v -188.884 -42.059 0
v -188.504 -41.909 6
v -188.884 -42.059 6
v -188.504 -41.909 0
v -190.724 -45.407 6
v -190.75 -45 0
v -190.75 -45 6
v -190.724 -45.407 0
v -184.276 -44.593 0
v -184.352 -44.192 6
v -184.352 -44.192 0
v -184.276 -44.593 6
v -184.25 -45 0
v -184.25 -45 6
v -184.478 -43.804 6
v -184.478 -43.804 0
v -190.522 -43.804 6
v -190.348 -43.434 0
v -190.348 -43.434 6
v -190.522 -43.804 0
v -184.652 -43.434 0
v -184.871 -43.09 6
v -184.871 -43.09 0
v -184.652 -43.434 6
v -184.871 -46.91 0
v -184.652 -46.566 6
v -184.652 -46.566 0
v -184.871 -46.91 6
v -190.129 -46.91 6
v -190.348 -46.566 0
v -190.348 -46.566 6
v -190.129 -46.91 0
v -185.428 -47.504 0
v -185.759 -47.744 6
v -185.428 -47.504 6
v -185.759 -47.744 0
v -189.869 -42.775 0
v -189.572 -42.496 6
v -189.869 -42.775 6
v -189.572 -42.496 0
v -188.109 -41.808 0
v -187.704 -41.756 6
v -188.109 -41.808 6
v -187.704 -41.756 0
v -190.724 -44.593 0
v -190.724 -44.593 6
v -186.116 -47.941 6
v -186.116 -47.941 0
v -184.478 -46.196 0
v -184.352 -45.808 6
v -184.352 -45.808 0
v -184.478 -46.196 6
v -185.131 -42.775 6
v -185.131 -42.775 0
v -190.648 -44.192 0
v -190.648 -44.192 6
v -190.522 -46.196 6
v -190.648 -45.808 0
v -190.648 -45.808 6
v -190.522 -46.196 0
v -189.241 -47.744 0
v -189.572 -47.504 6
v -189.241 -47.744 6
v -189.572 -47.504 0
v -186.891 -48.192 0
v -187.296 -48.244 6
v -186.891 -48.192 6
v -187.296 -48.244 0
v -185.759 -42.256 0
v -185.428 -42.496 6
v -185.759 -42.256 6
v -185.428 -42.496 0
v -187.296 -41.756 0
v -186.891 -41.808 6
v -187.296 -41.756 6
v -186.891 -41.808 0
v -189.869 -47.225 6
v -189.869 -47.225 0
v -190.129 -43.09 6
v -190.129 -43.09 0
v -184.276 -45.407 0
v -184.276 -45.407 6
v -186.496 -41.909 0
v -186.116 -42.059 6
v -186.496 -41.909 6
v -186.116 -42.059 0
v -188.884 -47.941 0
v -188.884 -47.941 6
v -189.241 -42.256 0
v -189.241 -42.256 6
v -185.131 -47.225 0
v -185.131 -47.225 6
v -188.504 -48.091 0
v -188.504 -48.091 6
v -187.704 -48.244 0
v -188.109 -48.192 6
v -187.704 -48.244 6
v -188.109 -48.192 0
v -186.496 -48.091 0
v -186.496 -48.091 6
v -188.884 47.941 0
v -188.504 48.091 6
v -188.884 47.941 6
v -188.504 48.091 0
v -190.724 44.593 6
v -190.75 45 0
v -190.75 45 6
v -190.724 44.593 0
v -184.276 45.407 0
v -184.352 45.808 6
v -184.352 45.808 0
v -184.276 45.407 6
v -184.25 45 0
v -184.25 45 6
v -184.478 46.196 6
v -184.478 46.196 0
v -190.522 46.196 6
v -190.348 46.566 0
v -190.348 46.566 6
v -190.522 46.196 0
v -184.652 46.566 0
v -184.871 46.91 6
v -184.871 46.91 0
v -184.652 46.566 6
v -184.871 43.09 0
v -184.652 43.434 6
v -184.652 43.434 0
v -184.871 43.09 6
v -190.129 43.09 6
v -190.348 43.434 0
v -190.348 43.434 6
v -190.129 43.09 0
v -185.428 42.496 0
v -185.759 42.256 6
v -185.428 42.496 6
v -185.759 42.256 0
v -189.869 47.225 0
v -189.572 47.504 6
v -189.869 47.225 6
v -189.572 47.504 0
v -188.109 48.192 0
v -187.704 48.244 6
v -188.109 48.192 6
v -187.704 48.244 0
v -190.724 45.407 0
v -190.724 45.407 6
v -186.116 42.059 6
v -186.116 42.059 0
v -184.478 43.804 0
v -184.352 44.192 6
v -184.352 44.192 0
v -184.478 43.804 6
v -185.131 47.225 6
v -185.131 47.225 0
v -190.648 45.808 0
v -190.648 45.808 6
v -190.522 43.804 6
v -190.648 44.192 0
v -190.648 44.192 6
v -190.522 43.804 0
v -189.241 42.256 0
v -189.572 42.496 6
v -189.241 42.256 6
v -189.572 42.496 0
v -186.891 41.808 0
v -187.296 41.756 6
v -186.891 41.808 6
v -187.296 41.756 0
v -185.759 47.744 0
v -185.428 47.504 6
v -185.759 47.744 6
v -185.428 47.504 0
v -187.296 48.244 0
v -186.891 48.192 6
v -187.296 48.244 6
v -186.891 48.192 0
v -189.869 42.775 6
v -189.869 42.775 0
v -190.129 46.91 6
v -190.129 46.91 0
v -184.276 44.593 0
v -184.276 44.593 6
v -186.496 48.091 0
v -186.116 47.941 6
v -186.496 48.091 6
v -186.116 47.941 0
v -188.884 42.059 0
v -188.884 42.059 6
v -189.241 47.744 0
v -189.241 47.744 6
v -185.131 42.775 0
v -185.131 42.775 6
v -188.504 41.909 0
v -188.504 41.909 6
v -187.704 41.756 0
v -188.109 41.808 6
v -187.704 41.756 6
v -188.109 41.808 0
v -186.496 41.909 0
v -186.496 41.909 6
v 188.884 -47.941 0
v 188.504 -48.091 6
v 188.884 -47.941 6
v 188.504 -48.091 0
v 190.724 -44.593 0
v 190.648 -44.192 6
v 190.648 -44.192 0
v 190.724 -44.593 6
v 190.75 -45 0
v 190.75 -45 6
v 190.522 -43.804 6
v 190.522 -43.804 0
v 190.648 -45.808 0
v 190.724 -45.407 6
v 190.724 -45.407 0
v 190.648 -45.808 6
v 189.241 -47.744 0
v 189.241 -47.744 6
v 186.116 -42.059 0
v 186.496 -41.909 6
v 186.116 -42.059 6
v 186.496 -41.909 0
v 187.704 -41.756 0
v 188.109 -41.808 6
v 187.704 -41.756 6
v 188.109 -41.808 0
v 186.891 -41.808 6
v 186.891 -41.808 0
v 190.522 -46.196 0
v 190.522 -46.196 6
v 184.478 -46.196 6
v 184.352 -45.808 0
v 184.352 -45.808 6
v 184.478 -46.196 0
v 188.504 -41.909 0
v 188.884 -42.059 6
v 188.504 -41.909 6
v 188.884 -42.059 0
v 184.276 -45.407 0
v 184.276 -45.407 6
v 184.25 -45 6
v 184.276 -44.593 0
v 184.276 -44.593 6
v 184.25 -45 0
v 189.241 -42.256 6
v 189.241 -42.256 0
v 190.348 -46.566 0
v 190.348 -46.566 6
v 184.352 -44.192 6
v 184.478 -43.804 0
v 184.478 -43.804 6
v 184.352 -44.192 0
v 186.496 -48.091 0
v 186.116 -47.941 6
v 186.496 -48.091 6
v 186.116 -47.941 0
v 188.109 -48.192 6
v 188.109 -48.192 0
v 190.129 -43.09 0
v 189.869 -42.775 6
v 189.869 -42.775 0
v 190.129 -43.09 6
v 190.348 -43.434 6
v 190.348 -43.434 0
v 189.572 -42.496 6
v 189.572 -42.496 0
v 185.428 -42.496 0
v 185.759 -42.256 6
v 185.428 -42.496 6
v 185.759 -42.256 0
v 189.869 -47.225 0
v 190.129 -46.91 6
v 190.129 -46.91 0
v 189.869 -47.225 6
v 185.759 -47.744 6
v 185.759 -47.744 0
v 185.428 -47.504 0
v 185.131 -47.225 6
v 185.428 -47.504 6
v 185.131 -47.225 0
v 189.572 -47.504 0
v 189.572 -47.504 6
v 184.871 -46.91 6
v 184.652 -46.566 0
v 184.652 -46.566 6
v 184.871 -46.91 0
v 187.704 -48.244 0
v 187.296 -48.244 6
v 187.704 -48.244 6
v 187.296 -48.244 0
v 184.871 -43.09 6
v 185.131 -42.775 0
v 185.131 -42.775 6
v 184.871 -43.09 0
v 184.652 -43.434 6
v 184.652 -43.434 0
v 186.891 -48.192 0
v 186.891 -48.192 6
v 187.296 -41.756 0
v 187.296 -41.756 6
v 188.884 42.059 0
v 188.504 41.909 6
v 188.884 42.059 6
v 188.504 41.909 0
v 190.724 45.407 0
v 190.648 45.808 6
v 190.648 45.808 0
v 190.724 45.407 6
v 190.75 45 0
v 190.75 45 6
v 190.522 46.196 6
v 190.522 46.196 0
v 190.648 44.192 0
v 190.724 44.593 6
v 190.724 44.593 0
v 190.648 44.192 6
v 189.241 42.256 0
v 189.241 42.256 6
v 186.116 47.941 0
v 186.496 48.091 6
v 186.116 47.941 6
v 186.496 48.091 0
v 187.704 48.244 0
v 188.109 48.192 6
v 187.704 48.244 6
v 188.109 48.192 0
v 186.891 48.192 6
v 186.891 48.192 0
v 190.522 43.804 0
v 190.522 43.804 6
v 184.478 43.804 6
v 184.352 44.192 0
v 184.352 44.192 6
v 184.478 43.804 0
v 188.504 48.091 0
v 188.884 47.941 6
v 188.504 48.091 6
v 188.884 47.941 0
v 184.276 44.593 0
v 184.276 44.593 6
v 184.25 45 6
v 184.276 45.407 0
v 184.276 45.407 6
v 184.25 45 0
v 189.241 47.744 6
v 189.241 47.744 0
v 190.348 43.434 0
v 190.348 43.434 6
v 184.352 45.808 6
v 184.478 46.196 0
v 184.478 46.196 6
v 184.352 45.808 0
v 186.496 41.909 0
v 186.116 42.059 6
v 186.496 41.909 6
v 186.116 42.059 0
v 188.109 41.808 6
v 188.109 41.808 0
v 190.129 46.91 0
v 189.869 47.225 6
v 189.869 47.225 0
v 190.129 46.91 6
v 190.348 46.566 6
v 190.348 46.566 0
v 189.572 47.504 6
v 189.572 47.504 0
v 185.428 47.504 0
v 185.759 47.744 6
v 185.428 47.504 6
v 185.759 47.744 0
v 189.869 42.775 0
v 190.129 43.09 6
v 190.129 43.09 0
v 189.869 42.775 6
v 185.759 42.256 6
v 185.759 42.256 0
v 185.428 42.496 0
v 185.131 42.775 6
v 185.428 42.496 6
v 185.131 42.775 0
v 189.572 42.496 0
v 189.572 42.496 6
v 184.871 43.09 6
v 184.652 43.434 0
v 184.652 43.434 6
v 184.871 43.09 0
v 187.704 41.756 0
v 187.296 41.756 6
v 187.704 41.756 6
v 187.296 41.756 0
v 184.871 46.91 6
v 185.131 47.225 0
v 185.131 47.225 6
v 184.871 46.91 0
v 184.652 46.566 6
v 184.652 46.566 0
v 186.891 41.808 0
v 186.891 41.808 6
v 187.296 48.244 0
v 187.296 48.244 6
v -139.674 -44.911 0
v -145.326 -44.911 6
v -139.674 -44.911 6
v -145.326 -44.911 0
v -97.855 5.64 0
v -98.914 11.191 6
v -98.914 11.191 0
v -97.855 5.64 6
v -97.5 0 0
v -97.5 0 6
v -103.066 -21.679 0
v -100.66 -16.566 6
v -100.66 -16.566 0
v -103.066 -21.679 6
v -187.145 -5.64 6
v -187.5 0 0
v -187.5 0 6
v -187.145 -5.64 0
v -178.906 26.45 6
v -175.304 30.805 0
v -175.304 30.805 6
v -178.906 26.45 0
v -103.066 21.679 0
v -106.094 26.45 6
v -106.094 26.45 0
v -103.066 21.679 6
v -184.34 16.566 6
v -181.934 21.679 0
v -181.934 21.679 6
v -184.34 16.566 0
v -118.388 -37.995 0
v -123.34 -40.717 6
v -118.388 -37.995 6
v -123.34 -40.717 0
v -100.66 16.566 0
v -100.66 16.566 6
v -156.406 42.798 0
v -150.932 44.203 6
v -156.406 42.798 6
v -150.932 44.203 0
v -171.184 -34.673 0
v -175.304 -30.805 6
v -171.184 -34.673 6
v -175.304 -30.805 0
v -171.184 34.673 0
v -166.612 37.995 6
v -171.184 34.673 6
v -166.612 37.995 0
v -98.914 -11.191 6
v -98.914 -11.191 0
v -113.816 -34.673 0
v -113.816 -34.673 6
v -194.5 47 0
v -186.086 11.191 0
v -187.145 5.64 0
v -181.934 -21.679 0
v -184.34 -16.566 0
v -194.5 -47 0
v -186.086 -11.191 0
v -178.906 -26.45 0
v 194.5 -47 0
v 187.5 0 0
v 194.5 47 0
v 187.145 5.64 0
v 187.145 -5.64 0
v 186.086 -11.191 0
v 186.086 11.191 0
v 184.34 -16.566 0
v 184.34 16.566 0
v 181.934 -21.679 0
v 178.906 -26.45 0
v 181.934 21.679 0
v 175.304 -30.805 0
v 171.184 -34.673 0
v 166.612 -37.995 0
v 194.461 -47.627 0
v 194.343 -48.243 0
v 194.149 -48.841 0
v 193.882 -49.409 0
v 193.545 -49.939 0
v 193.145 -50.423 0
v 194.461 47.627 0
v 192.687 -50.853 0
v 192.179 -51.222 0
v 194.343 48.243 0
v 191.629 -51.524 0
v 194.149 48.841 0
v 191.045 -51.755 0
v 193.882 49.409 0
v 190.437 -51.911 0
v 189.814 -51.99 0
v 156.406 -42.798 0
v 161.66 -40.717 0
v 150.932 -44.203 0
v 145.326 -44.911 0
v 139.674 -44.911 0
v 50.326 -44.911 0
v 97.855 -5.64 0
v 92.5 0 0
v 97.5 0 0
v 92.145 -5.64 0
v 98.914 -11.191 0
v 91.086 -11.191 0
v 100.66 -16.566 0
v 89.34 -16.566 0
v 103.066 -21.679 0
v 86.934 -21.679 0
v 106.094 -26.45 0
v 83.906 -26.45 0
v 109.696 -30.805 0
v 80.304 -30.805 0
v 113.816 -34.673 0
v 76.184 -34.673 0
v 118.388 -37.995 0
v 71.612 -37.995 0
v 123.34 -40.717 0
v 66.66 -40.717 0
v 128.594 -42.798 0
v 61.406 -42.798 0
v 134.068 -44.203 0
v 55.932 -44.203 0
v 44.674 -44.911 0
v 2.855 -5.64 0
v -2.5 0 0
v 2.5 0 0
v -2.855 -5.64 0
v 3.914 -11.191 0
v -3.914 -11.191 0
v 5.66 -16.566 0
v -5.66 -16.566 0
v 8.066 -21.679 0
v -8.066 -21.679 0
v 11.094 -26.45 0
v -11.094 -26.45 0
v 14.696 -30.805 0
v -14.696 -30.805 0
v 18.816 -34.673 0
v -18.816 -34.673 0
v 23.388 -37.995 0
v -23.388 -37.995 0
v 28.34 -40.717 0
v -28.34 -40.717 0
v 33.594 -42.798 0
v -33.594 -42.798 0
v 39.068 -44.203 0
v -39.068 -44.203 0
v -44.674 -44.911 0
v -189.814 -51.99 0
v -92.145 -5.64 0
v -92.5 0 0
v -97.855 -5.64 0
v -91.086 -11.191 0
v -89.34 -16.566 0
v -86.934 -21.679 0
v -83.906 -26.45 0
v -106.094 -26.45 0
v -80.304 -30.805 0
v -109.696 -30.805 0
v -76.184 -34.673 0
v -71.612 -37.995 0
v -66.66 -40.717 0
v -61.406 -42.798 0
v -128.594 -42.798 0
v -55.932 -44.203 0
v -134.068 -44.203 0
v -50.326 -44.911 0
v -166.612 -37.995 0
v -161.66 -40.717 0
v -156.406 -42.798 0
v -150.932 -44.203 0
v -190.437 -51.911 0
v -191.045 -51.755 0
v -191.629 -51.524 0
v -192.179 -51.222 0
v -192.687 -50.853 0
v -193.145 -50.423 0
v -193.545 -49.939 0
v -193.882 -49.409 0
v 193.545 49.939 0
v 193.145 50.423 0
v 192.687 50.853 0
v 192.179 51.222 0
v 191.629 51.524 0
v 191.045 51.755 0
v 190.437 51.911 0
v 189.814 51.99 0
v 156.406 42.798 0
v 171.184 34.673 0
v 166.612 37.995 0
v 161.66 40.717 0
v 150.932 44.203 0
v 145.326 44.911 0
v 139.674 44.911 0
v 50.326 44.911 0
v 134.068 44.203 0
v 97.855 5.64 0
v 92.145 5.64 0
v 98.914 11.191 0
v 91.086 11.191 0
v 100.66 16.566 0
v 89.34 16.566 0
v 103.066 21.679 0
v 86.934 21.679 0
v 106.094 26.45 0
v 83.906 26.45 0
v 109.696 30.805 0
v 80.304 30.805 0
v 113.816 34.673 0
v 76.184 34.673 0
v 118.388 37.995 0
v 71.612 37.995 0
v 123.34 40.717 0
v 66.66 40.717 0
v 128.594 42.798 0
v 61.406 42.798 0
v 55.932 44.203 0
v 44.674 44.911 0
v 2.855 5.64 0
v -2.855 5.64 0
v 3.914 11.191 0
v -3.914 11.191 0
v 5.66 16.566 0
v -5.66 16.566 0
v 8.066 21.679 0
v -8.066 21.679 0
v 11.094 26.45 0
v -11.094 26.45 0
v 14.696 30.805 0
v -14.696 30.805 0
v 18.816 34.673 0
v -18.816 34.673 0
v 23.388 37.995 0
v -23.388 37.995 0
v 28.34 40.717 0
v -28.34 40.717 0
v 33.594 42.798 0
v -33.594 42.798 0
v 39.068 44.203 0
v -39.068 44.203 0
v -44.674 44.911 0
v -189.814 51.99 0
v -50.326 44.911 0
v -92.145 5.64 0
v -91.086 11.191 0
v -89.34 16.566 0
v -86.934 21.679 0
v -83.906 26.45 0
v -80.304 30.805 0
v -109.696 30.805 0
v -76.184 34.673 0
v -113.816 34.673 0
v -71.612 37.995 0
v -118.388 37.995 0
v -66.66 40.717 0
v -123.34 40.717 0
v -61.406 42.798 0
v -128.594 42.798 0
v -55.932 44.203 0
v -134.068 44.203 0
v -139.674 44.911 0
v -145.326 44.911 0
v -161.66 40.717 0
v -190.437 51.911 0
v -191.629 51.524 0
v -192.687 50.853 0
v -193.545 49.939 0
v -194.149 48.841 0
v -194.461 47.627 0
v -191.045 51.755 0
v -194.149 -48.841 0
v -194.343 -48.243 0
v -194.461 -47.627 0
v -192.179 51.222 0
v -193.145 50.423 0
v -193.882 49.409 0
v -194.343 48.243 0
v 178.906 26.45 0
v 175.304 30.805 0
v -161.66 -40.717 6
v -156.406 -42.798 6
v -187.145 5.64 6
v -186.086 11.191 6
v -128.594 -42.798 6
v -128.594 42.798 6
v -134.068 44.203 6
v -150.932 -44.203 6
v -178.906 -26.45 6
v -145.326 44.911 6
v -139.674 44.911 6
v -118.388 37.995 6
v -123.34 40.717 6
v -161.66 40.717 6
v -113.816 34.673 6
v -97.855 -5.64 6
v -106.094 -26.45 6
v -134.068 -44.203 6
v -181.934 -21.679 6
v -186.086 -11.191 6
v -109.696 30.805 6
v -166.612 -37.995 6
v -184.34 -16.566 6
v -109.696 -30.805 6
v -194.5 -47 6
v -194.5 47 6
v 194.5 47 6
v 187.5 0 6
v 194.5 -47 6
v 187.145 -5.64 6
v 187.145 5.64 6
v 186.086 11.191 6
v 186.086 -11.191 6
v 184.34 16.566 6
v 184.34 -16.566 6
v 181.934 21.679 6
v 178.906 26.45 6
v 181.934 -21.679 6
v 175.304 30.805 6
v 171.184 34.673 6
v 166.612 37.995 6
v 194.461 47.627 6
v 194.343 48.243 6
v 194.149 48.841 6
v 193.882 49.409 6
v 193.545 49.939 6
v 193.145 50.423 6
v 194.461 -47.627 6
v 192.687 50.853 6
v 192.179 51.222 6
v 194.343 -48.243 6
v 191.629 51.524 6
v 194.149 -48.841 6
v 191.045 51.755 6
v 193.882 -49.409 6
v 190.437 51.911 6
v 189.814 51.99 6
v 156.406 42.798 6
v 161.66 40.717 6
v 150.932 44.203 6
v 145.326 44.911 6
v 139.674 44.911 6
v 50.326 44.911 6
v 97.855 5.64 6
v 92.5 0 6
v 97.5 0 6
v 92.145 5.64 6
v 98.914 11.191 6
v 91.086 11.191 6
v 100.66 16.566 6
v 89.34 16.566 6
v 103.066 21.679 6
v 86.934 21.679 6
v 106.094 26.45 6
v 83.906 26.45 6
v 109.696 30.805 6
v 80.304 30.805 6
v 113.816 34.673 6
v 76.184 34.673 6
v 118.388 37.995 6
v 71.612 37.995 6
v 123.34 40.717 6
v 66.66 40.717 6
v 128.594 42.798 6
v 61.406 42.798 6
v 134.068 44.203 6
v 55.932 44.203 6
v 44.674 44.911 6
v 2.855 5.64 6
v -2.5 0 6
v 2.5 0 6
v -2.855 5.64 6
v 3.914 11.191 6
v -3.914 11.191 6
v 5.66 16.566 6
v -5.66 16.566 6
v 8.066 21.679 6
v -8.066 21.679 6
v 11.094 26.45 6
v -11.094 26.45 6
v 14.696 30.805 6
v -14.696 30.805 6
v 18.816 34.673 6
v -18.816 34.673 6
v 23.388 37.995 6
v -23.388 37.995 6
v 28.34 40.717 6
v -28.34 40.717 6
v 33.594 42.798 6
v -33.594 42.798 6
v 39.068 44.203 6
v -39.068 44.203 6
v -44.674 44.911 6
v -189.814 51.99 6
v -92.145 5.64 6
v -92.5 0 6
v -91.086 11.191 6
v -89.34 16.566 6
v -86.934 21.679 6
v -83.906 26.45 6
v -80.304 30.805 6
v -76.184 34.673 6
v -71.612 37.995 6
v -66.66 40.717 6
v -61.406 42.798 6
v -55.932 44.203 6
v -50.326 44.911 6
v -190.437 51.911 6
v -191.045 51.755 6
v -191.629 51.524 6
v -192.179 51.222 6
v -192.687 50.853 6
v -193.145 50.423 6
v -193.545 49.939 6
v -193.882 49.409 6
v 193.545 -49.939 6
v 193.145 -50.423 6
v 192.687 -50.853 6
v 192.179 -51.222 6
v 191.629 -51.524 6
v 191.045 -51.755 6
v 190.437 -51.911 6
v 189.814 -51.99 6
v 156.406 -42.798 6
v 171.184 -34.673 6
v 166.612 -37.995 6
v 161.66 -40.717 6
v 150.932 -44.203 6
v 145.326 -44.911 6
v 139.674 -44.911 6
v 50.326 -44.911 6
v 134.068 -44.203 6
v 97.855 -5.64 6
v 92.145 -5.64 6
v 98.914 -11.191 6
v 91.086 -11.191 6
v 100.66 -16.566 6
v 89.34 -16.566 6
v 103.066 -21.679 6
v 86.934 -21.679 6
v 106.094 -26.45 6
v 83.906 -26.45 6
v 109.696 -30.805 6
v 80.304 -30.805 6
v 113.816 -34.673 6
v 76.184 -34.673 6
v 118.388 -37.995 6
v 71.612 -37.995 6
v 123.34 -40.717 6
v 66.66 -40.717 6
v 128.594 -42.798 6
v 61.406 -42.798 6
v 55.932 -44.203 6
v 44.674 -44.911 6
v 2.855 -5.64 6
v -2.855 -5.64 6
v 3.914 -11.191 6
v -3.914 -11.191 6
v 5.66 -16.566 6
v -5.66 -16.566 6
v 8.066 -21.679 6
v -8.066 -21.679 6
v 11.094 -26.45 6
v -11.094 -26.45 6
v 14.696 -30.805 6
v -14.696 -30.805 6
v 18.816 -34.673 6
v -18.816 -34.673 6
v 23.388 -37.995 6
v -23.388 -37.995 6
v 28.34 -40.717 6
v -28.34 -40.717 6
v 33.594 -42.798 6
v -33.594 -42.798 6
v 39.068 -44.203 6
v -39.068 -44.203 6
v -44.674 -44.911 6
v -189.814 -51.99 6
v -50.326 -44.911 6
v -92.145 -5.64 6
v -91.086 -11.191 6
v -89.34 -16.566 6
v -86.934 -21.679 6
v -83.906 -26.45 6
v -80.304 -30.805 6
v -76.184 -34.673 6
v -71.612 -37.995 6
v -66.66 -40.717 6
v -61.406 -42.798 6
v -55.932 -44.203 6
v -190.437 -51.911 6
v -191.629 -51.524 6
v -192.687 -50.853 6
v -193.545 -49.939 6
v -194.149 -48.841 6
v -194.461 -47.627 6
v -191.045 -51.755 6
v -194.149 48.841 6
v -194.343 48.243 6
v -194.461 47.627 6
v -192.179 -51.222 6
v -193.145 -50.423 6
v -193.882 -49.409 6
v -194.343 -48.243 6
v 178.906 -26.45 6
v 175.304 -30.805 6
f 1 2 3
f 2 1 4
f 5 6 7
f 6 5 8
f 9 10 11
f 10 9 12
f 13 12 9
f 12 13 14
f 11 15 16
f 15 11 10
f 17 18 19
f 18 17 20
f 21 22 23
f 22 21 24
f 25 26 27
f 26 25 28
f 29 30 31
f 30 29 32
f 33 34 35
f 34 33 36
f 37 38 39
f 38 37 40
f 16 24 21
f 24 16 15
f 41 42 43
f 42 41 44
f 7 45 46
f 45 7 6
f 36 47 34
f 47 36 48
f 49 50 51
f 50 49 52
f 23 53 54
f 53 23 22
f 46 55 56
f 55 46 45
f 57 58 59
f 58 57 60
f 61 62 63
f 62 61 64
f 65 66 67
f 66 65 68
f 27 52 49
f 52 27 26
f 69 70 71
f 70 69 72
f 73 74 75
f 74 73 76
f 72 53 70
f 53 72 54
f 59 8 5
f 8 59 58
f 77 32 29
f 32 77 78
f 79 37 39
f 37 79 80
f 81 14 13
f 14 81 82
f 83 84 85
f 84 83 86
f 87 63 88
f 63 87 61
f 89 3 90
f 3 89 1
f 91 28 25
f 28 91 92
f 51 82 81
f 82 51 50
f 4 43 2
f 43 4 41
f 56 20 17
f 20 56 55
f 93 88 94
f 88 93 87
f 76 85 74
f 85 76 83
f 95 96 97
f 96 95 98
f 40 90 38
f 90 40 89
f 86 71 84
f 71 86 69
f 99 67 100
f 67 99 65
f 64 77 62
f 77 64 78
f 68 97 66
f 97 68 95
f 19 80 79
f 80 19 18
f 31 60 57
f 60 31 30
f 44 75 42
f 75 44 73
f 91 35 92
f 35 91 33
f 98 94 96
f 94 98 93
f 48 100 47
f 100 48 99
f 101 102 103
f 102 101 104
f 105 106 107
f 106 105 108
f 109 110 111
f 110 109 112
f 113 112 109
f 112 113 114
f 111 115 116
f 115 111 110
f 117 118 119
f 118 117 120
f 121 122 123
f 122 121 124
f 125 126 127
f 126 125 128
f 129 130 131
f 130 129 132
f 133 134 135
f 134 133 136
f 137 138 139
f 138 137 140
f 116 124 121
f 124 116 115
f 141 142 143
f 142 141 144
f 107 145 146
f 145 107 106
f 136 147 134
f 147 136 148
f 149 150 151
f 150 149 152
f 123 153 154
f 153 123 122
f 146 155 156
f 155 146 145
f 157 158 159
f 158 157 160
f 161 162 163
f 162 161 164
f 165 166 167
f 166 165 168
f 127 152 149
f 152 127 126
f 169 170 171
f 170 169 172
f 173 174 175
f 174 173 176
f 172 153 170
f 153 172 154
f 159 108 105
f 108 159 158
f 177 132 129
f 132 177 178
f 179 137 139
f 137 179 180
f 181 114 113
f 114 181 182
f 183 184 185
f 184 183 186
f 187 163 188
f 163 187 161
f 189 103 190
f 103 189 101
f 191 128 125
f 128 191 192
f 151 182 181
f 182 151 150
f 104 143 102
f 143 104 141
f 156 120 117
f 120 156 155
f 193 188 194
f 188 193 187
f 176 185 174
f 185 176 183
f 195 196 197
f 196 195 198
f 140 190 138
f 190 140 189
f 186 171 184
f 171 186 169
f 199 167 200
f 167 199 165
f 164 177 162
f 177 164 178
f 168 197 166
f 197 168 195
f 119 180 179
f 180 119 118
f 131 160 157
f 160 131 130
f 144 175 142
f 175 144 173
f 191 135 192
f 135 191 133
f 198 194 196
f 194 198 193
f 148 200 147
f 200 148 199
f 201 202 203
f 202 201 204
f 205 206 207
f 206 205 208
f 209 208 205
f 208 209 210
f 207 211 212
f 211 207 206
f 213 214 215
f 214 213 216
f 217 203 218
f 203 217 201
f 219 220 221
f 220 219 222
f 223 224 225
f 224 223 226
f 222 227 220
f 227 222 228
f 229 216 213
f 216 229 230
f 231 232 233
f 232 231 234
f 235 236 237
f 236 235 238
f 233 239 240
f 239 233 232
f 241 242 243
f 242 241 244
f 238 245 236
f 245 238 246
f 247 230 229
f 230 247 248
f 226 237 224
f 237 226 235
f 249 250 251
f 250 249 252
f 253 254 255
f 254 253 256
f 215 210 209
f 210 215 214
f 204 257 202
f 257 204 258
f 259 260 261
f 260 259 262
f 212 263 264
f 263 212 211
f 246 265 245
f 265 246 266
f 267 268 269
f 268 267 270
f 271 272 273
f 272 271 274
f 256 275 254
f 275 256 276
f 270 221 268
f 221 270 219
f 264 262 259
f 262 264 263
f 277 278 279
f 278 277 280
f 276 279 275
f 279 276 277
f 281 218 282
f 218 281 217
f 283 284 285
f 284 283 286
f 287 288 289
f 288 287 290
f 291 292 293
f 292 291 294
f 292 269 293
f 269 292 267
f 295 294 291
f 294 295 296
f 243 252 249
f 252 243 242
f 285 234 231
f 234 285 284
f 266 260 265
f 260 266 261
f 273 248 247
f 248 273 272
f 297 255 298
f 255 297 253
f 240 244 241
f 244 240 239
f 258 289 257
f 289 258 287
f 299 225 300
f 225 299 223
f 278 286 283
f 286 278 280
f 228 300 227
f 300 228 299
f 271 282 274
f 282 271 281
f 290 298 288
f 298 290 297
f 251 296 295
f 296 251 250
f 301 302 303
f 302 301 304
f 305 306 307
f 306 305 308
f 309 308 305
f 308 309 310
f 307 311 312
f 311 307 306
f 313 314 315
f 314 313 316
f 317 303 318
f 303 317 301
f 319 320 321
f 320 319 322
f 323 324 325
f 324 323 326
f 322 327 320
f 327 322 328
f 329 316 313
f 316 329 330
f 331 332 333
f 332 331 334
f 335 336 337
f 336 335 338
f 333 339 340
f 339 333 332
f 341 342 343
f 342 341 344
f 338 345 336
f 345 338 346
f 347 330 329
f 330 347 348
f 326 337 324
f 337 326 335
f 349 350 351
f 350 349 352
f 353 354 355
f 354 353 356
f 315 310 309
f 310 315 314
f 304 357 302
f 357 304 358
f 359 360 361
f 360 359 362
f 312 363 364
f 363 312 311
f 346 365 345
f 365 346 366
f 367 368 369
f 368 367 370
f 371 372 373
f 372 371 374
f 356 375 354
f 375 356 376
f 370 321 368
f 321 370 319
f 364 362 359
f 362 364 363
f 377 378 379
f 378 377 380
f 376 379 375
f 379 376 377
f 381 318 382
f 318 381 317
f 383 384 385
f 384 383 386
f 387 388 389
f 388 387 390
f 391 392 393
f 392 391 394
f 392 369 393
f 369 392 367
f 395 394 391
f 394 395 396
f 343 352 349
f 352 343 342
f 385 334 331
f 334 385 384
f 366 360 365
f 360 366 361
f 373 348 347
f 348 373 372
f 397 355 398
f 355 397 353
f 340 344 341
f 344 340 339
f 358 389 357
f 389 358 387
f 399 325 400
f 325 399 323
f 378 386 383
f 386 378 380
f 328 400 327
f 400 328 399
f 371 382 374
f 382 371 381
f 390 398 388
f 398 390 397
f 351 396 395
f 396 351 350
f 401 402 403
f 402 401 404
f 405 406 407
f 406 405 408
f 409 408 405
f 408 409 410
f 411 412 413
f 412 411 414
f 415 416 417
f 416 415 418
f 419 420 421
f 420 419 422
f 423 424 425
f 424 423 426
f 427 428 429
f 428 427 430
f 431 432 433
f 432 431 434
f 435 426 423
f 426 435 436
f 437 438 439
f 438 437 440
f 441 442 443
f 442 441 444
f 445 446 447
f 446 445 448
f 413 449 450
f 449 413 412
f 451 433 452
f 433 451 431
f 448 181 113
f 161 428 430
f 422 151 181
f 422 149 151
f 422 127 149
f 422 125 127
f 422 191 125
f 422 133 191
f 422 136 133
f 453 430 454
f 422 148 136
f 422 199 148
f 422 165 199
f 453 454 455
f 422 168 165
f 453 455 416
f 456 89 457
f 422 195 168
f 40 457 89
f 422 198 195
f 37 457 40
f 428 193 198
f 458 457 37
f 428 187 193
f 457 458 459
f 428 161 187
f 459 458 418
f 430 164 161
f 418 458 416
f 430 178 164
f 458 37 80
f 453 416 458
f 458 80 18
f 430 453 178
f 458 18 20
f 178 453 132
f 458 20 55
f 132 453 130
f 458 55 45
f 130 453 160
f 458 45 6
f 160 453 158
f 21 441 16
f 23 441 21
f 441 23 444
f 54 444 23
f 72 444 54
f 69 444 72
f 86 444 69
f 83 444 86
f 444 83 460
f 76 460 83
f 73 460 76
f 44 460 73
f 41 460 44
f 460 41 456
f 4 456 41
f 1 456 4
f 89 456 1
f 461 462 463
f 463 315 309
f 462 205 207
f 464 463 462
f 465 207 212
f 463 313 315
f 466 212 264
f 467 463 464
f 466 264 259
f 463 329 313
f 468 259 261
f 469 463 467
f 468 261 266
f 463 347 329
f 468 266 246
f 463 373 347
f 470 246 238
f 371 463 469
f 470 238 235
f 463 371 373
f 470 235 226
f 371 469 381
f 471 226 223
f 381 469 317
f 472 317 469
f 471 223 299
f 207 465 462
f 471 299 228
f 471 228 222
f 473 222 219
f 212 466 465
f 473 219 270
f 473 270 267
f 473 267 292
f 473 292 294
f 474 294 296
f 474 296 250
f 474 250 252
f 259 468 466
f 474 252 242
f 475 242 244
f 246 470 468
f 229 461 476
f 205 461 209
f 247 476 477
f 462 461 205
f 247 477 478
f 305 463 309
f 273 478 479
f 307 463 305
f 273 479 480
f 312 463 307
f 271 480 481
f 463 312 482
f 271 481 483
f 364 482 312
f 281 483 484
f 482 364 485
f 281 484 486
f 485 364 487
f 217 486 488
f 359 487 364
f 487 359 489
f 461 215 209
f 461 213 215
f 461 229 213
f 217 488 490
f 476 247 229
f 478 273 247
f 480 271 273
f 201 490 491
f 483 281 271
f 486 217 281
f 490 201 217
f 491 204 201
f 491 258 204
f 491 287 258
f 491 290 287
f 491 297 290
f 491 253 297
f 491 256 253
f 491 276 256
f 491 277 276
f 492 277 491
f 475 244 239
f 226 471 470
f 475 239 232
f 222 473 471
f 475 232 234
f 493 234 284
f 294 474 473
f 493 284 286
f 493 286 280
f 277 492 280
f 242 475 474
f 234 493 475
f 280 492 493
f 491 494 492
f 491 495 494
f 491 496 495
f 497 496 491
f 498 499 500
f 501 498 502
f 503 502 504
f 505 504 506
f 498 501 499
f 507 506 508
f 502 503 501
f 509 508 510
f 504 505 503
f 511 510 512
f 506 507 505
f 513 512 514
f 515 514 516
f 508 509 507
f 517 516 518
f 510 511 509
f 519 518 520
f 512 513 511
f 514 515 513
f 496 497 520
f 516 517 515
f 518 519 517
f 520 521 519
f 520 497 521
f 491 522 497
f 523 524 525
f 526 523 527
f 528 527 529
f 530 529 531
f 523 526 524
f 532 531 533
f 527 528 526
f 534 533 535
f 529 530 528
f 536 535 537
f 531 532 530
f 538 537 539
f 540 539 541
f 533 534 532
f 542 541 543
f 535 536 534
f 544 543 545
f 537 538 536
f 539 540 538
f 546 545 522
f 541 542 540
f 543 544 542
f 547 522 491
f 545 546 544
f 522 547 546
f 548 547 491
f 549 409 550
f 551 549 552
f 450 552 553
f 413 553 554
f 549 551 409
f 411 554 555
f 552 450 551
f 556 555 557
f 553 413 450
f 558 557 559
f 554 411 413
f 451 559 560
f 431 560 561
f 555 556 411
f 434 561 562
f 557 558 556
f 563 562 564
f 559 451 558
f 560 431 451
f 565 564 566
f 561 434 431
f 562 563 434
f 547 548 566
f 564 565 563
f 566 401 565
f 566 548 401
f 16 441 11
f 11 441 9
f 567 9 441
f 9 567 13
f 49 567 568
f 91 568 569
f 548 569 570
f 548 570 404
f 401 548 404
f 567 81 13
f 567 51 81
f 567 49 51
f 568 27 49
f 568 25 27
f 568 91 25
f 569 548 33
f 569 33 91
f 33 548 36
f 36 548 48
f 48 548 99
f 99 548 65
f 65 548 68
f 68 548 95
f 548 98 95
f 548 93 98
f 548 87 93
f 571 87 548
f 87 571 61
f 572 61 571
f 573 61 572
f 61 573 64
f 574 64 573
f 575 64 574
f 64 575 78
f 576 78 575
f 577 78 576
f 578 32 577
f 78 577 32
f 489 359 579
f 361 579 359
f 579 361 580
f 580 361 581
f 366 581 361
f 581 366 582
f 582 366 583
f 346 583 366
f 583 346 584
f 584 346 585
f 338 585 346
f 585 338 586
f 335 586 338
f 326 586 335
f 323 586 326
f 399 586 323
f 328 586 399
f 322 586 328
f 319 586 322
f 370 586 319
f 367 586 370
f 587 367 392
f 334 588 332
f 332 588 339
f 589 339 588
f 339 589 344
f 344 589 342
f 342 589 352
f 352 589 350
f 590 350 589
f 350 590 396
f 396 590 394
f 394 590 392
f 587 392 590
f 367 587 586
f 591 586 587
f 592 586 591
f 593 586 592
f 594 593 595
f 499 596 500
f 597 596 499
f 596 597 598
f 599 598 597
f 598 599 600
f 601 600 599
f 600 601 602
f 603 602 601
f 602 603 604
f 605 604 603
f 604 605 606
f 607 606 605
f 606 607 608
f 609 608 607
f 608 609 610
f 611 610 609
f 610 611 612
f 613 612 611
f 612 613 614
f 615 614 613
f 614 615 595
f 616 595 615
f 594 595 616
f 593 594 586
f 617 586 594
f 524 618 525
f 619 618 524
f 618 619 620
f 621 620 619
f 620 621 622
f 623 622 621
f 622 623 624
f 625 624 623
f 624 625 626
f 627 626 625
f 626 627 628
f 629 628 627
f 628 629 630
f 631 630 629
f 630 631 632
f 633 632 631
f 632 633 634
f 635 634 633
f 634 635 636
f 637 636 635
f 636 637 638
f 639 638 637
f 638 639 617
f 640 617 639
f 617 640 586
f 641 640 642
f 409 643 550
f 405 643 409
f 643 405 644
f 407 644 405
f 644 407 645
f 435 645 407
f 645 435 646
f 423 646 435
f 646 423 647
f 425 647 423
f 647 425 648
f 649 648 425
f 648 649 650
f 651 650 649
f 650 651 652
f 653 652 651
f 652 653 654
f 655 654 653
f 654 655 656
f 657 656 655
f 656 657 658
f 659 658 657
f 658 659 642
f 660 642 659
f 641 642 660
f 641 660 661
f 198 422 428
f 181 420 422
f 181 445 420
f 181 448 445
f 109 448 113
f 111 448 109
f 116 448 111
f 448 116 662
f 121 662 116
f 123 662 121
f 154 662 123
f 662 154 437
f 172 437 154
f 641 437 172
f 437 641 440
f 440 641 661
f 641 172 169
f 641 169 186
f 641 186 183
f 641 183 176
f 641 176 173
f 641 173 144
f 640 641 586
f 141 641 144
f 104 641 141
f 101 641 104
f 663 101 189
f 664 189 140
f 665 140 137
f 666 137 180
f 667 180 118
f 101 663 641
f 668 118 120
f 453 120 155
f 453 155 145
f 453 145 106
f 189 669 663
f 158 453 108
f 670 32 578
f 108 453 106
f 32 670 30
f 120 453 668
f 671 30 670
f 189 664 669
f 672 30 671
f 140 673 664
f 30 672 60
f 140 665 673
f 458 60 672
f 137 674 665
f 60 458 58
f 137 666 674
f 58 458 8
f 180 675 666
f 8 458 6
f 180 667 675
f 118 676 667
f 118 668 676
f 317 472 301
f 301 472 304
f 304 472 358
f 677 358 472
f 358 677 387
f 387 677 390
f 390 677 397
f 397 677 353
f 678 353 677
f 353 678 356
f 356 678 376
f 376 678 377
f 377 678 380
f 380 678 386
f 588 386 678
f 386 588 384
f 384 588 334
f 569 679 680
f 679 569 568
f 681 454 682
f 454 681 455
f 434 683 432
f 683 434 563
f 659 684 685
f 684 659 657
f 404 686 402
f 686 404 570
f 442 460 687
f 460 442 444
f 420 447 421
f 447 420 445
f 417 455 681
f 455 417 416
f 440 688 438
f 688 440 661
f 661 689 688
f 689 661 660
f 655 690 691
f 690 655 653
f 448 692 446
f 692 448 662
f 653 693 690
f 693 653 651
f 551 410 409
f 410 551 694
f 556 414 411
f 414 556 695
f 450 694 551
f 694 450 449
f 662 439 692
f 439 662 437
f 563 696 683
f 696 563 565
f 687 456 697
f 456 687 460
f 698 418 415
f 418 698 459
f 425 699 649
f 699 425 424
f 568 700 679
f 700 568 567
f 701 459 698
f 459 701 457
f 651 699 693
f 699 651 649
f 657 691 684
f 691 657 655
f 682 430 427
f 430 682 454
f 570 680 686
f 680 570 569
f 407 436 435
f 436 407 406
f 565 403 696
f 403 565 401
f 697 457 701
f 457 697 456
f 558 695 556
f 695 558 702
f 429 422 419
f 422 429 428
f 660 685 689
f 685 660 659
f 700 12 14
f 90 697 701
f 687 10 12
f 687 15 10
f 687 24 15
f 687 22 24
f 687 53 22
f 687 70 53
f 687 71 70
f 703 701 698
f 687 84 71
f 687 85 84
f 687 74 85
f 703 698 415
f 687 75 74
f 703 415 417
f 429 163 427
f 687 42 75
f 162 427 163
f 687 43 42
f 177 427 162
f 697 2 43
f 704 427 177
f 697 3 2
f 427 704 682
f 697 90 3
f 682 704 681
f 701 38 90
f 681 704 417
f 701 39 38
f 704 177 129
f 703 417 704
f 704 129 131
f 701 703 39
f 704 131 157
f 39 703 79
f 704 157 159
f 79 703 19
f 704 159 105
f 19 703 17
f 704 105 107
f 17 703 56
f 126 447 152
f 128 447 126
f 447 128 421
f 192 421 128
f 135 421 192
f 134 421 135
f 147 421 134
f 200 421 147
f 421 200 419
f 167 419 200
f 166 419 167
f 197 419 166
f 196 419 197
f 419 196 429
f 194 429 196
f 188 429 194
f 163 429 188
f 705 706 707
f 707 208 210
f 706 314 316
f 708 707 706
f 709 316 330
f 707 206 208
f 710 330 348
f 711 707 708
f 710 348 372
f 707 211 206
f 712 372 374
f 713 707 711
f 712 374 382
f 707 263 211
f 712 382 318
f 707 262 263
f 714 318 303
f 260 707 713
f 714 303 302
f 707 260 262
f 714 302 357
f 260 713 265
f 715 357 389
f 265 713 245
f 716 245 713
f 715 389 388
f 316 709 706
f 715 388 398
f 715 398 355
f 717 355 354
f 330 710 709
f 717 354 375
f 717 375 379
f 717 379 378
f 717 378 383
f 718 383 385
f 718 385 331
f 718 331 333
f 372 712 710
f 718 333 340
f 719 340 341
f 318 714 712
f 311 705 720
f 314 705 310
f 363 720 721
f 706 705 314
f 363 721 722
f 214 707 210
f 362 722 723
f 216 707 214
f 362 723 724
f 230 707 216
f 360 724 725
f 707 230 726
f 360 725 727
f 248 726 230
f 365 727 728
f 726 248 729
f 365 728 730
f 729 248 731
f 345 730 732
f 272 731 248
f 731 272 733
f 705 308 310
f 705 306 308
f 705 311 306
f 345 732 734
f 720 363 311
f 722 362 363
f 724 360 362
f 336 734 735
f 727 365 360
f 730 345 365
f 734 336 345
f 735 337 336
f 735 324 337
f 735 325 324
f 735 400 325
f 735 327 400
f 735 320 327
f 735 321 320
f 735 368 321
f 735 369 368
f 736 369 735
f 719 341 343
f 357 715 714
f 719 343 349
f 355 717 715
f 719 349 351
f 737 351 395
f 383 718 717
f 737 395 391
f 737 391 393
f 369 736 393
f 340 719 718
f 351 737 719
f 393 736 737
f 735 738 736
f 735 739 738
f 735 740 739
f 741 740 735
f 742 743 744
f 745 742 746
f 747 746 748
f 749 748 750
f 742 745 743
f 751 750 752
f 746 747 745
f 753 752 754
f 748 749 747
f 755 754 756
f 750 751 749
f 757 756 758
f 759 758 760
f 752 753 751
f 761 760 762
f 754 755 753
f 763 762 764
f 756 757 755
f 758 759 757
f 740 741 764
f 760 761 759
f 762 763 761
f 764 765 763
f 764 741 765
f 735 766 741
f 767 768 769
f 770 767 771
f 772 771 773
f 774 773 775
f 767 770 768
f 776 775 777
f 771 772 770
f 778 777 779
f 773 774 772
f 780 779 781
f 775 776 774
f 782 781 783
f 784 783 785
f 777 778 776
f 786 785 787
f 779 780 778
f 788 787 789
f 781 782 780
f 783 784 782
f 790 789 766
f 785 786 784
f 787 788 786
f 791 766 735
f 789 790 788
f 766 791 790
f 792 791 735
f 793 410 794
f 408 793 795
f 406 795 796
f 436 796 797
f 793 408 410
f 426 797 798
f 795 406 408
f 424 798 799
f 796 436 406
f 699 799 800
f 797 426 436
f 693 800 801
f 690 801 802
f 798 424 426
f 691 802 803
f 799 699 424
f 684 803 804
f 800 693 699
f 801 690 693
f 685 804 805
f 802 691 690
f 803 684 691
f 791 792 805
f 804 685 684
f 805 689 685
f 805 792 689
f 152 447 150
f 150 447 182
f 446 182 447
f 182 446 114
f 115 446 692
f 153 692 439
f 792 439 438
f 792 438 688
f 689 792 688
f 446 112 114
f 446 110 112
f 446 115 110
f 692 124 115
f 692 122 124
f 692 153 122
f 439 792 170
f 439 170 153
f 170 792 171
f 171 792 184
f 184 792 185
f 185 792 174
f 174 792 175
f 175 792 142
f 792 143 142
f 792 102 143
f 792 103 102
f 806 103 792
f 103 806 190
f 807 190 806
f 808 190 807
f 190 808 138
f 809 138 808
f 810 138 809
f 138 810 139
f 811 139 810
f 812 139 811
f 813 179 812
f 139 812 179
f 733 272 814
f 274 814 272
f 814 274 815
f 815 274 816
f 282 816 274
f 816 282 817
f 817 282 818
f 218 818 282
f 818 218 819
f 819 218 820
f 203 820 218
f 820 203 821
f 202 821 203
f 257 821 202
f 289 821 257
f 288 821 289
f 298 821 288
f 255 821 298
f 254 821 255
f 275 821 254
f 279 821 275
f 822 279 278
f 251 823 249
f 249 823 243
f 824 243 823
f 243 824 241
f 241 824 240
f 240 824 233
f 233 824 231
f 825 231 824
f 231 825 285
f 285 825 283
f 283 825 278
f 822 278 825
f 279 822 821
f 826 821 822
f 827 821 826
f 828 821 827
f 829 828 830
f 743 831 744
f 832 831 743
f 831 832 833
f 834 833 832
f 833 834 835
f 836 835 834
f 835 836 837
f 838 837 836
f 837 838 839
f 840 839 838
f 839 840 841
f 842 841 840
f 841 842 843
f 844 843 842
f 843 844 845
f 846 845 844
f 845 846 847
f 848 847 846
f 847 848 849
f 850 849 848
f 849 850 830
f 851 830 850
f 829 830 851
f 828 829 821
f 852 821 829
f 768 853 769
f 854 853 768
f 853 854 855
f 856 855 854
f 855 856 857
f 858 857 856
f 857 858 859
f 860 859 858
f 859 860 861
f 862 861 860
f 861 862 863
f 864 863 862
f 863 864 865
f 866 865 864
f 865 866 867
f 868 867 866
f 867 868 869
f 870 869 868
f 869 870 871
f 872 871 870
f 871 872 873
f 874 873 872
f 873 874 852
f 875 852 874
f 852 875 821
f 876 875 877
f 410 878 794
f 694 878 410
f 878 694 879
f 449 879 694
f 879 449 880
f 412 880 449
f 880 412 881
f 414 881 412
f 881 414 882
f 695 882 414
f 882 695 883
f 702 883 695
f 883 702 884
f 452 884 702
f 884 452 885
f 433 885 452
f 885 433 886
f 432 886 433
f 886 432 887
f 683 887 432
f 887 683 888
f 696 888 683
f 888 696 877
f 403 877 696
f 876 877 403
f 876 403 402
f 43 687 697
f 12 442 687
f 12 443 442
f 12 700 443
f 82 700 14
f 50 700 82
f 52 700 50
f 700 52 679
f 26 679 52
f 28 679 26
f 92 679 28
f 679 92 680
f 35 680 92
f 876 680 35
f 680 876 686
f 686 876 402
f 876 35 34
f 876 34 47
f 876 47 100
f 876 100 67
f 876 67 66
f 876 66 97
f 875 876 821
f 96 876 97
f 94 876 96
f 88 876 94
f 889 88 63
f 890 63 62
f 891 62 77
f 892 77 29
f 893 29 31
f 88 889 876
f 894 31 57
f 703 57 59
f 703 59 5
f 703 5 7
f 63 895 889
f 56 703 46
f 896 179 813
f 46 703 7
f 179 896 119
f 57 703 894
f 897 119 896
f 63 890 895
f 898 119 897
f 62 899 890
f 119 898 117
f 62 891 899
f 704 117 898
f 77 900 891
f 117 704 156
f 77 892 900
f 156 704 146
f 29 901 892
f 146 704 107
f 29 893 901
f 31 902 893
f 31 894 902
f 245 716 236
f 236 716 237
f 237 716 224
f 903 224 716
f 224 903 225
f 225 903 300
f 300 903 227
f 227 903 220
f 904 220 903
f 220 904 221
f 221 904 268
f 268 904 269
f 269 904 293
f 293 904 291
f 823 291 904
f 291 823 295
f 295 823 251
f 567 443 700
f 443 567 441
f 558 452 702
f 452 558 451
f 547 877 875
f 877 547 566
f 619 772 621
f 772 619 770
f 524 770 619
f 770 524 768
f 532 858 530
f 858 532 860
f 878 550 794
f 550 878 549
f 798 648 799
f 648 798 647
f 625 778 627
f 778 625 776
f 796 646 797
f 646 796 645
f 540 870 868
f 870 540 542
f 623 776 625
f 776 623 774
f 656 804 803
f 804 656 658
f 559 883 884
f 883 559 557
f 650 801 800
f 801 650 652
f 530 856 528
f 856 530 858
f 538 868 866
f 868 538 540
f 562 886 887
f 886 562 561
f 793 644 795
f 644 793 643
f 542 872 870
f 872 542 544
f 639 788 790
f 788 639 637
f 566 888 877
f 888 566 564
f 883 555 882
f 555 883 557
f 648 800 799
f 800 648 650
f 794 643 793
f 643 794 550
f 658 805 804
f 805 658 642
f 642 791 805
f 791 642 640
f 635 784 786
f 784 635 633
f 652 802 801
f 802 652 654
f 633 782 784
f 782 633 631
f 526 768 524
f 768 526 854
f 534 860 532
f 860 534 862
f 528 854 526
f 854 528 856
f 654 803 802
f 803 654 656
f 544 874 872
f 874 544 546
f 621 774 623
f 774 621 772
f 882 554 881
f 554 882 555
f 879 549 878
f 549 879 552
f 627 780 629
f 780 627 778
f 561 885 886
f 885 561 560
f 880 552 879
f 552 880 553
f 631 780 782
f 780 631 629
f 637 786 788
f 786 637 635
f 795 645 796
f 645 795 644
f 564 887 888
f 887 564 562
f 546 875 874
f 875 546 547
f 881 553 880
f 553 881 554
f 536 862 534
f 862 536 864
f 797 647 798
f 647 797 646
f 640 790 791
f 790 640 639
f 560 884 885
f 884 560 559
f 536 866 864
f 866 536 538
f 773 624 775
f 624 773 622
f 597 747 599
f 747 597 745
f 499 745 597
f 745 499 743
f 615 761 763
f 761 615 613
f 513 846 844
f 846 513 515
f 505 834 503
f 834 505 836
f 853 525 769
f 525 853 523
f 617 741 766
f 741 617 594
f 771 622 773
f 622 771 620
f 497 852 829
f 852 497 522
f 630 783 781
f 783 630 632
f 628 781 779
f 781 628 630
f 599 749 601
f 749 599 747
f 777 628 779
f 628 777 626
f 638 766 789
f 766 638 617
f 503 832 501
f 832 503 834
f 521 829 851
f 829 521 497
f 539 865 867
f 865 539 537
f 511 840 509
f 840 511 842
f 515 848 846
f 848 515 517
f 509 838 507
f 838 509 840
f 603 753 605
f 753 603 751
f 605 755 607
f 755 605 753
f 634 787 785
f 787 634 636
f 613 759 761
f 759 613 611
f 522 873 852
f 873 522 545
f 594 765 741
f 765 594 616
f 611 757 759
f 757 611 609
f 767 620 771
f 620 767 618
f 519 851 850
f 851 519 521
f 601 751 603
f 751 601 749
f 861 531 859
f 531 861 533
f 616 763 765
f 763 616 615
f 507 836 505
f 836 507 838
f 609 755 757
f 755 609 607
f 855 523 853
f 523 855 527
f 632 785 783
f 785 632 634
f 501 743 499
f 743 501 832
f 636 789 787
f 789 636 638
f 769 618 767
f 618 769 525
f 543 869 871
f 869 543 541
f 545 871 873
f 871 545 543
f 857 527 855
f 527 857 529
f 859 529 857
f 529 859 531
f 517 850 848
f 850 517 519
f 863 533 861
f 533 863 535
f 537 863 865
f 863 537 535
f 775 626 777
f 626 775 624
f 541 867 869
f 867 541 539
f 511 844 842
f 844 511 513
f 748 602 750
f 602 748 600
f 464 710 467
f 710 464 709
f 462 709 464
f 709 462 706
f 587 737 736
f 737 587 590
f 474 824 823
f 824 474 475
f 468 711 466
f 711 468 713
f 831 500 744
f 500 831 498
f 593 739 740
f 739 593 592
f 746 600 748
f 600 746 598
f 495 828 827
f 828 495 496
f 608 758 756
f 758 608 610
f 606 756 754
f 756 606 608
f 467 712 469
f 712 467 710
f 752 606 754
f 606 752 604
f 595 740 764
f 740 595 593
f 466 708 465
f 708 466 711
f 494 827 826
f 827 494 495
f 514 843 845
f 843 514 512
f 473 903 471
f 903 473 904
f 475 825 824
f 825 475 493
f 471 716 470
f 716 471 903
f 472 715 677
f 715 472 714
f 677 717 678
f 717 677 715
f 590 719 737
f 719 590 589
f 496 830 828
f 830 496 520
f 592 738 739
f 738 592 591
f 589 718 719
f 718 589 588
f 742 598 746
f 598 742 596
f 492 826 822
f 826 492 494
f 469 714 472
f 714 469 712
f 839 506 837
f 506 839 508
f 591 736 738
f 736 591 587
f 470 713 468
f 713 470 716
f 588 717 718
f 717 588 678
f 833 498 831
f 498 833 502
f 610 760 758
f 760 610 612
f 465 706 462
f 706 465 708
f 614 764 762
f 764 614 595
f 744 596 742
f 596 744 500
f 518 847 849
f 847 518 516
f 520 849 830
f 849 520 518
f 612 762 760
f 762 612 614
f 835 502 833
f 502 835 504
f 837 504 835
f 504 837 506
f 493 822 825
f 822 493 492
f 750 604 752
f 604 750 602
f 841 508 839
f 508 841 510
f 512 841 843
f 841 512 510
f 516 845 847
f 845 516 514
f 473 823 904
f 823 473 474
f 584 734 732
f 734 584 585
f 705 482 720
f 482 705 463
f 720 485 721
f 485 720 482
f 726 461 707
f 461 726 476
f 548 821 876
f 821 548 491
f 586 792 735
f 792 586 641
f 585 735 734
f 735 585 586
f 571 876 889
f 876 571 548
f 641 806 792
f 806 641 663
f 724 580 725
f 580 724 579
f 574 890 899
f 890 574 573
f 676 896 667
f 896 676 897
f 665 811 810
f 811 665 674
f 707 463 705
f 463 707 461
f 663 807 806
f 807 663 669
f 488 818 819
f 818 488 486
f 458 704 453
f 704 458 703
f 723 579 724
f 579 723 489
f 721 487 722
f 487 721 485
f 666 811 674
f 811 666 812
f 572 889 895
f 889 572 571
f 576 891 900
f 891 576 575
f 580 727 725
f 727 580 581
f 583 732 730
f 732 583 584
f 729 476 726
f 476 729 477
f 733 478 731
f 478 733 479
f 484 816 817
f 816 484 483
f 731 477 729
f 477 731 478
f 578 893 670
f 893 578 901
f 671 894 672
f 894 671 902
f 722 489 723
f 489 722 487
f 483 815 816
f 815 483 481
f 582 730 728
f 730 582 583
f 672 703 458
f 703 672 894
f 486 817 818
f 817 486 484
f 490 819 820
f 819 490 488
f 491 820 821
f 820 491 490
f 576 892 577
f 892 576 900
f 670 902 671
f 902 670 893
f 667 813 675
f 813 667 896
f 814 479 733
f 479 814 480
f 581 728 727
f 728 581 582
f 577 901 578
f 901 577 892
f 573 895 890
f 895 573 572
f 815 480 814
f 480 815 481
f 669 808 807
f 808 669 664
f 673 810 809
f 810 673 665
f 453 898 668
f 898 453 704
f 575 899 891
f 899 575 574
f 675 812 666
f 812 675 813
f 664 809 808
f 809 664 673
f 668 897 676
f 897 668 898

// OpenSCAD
$fn = 50;


difference() {
	union() {
		hull() {
			translate(v = [-189.5000000000, 47.0000000000, 0]) {
				cylinder(h = 6, r = 5);
			}
			translate(v = [189.5000000000, 47.0000000000, 0]) {
				cylinder(h = 6, r = 5);
			}
			translate(v = [-189.5000000000, -47.0000000000, 0]) {
				cylinder(h = 6, r = 5);
			}
			translate(v = [189.5000000000, -47.0000000000, 0]) {
				cylinder(h = 6, r = 5);
			}
		}
	}
	union() {
		#translate(v = [-187.5000000000, -45.0000000000, -100.0000000000]) {
			cylinder(h = 200, r = 3.2500000000);
		}
		#translate(v = [-187.5000000000, 45.0000000000, -100.0000000000]) {
			cylinder(h = 200, r = 3.2500000000);
		}
		#translate(v = [187.5000000000, -45.0000000000, -100.0000000000]) {
			cylinder(h = 200, r = 3.2500000000);
		}
		#translate(v = [187.5000000000, 45.0000000000, -100.0000000000]) {
			cylinder(h = 200, r = 3.2500000000);
		}
		#translate(v = [-142.5000000000, 0, 0]) {
			cylinder(h = 6, r = 45.0000000000);
		}
		#translate(v = [-47.5000000000, 0, 0]) {
			cylinder(h = 6, r = 45.0000000000);
		}
		#translate(v = [47.5000000000, 0, 0]) {
			cylinder(h = 6, r = 45.0000000000);
		}
		#translate(v = [142.5000000000, 0, 0]) {
			cylinder(h = 6, r = 45.0000000000);
		}
	}
}
